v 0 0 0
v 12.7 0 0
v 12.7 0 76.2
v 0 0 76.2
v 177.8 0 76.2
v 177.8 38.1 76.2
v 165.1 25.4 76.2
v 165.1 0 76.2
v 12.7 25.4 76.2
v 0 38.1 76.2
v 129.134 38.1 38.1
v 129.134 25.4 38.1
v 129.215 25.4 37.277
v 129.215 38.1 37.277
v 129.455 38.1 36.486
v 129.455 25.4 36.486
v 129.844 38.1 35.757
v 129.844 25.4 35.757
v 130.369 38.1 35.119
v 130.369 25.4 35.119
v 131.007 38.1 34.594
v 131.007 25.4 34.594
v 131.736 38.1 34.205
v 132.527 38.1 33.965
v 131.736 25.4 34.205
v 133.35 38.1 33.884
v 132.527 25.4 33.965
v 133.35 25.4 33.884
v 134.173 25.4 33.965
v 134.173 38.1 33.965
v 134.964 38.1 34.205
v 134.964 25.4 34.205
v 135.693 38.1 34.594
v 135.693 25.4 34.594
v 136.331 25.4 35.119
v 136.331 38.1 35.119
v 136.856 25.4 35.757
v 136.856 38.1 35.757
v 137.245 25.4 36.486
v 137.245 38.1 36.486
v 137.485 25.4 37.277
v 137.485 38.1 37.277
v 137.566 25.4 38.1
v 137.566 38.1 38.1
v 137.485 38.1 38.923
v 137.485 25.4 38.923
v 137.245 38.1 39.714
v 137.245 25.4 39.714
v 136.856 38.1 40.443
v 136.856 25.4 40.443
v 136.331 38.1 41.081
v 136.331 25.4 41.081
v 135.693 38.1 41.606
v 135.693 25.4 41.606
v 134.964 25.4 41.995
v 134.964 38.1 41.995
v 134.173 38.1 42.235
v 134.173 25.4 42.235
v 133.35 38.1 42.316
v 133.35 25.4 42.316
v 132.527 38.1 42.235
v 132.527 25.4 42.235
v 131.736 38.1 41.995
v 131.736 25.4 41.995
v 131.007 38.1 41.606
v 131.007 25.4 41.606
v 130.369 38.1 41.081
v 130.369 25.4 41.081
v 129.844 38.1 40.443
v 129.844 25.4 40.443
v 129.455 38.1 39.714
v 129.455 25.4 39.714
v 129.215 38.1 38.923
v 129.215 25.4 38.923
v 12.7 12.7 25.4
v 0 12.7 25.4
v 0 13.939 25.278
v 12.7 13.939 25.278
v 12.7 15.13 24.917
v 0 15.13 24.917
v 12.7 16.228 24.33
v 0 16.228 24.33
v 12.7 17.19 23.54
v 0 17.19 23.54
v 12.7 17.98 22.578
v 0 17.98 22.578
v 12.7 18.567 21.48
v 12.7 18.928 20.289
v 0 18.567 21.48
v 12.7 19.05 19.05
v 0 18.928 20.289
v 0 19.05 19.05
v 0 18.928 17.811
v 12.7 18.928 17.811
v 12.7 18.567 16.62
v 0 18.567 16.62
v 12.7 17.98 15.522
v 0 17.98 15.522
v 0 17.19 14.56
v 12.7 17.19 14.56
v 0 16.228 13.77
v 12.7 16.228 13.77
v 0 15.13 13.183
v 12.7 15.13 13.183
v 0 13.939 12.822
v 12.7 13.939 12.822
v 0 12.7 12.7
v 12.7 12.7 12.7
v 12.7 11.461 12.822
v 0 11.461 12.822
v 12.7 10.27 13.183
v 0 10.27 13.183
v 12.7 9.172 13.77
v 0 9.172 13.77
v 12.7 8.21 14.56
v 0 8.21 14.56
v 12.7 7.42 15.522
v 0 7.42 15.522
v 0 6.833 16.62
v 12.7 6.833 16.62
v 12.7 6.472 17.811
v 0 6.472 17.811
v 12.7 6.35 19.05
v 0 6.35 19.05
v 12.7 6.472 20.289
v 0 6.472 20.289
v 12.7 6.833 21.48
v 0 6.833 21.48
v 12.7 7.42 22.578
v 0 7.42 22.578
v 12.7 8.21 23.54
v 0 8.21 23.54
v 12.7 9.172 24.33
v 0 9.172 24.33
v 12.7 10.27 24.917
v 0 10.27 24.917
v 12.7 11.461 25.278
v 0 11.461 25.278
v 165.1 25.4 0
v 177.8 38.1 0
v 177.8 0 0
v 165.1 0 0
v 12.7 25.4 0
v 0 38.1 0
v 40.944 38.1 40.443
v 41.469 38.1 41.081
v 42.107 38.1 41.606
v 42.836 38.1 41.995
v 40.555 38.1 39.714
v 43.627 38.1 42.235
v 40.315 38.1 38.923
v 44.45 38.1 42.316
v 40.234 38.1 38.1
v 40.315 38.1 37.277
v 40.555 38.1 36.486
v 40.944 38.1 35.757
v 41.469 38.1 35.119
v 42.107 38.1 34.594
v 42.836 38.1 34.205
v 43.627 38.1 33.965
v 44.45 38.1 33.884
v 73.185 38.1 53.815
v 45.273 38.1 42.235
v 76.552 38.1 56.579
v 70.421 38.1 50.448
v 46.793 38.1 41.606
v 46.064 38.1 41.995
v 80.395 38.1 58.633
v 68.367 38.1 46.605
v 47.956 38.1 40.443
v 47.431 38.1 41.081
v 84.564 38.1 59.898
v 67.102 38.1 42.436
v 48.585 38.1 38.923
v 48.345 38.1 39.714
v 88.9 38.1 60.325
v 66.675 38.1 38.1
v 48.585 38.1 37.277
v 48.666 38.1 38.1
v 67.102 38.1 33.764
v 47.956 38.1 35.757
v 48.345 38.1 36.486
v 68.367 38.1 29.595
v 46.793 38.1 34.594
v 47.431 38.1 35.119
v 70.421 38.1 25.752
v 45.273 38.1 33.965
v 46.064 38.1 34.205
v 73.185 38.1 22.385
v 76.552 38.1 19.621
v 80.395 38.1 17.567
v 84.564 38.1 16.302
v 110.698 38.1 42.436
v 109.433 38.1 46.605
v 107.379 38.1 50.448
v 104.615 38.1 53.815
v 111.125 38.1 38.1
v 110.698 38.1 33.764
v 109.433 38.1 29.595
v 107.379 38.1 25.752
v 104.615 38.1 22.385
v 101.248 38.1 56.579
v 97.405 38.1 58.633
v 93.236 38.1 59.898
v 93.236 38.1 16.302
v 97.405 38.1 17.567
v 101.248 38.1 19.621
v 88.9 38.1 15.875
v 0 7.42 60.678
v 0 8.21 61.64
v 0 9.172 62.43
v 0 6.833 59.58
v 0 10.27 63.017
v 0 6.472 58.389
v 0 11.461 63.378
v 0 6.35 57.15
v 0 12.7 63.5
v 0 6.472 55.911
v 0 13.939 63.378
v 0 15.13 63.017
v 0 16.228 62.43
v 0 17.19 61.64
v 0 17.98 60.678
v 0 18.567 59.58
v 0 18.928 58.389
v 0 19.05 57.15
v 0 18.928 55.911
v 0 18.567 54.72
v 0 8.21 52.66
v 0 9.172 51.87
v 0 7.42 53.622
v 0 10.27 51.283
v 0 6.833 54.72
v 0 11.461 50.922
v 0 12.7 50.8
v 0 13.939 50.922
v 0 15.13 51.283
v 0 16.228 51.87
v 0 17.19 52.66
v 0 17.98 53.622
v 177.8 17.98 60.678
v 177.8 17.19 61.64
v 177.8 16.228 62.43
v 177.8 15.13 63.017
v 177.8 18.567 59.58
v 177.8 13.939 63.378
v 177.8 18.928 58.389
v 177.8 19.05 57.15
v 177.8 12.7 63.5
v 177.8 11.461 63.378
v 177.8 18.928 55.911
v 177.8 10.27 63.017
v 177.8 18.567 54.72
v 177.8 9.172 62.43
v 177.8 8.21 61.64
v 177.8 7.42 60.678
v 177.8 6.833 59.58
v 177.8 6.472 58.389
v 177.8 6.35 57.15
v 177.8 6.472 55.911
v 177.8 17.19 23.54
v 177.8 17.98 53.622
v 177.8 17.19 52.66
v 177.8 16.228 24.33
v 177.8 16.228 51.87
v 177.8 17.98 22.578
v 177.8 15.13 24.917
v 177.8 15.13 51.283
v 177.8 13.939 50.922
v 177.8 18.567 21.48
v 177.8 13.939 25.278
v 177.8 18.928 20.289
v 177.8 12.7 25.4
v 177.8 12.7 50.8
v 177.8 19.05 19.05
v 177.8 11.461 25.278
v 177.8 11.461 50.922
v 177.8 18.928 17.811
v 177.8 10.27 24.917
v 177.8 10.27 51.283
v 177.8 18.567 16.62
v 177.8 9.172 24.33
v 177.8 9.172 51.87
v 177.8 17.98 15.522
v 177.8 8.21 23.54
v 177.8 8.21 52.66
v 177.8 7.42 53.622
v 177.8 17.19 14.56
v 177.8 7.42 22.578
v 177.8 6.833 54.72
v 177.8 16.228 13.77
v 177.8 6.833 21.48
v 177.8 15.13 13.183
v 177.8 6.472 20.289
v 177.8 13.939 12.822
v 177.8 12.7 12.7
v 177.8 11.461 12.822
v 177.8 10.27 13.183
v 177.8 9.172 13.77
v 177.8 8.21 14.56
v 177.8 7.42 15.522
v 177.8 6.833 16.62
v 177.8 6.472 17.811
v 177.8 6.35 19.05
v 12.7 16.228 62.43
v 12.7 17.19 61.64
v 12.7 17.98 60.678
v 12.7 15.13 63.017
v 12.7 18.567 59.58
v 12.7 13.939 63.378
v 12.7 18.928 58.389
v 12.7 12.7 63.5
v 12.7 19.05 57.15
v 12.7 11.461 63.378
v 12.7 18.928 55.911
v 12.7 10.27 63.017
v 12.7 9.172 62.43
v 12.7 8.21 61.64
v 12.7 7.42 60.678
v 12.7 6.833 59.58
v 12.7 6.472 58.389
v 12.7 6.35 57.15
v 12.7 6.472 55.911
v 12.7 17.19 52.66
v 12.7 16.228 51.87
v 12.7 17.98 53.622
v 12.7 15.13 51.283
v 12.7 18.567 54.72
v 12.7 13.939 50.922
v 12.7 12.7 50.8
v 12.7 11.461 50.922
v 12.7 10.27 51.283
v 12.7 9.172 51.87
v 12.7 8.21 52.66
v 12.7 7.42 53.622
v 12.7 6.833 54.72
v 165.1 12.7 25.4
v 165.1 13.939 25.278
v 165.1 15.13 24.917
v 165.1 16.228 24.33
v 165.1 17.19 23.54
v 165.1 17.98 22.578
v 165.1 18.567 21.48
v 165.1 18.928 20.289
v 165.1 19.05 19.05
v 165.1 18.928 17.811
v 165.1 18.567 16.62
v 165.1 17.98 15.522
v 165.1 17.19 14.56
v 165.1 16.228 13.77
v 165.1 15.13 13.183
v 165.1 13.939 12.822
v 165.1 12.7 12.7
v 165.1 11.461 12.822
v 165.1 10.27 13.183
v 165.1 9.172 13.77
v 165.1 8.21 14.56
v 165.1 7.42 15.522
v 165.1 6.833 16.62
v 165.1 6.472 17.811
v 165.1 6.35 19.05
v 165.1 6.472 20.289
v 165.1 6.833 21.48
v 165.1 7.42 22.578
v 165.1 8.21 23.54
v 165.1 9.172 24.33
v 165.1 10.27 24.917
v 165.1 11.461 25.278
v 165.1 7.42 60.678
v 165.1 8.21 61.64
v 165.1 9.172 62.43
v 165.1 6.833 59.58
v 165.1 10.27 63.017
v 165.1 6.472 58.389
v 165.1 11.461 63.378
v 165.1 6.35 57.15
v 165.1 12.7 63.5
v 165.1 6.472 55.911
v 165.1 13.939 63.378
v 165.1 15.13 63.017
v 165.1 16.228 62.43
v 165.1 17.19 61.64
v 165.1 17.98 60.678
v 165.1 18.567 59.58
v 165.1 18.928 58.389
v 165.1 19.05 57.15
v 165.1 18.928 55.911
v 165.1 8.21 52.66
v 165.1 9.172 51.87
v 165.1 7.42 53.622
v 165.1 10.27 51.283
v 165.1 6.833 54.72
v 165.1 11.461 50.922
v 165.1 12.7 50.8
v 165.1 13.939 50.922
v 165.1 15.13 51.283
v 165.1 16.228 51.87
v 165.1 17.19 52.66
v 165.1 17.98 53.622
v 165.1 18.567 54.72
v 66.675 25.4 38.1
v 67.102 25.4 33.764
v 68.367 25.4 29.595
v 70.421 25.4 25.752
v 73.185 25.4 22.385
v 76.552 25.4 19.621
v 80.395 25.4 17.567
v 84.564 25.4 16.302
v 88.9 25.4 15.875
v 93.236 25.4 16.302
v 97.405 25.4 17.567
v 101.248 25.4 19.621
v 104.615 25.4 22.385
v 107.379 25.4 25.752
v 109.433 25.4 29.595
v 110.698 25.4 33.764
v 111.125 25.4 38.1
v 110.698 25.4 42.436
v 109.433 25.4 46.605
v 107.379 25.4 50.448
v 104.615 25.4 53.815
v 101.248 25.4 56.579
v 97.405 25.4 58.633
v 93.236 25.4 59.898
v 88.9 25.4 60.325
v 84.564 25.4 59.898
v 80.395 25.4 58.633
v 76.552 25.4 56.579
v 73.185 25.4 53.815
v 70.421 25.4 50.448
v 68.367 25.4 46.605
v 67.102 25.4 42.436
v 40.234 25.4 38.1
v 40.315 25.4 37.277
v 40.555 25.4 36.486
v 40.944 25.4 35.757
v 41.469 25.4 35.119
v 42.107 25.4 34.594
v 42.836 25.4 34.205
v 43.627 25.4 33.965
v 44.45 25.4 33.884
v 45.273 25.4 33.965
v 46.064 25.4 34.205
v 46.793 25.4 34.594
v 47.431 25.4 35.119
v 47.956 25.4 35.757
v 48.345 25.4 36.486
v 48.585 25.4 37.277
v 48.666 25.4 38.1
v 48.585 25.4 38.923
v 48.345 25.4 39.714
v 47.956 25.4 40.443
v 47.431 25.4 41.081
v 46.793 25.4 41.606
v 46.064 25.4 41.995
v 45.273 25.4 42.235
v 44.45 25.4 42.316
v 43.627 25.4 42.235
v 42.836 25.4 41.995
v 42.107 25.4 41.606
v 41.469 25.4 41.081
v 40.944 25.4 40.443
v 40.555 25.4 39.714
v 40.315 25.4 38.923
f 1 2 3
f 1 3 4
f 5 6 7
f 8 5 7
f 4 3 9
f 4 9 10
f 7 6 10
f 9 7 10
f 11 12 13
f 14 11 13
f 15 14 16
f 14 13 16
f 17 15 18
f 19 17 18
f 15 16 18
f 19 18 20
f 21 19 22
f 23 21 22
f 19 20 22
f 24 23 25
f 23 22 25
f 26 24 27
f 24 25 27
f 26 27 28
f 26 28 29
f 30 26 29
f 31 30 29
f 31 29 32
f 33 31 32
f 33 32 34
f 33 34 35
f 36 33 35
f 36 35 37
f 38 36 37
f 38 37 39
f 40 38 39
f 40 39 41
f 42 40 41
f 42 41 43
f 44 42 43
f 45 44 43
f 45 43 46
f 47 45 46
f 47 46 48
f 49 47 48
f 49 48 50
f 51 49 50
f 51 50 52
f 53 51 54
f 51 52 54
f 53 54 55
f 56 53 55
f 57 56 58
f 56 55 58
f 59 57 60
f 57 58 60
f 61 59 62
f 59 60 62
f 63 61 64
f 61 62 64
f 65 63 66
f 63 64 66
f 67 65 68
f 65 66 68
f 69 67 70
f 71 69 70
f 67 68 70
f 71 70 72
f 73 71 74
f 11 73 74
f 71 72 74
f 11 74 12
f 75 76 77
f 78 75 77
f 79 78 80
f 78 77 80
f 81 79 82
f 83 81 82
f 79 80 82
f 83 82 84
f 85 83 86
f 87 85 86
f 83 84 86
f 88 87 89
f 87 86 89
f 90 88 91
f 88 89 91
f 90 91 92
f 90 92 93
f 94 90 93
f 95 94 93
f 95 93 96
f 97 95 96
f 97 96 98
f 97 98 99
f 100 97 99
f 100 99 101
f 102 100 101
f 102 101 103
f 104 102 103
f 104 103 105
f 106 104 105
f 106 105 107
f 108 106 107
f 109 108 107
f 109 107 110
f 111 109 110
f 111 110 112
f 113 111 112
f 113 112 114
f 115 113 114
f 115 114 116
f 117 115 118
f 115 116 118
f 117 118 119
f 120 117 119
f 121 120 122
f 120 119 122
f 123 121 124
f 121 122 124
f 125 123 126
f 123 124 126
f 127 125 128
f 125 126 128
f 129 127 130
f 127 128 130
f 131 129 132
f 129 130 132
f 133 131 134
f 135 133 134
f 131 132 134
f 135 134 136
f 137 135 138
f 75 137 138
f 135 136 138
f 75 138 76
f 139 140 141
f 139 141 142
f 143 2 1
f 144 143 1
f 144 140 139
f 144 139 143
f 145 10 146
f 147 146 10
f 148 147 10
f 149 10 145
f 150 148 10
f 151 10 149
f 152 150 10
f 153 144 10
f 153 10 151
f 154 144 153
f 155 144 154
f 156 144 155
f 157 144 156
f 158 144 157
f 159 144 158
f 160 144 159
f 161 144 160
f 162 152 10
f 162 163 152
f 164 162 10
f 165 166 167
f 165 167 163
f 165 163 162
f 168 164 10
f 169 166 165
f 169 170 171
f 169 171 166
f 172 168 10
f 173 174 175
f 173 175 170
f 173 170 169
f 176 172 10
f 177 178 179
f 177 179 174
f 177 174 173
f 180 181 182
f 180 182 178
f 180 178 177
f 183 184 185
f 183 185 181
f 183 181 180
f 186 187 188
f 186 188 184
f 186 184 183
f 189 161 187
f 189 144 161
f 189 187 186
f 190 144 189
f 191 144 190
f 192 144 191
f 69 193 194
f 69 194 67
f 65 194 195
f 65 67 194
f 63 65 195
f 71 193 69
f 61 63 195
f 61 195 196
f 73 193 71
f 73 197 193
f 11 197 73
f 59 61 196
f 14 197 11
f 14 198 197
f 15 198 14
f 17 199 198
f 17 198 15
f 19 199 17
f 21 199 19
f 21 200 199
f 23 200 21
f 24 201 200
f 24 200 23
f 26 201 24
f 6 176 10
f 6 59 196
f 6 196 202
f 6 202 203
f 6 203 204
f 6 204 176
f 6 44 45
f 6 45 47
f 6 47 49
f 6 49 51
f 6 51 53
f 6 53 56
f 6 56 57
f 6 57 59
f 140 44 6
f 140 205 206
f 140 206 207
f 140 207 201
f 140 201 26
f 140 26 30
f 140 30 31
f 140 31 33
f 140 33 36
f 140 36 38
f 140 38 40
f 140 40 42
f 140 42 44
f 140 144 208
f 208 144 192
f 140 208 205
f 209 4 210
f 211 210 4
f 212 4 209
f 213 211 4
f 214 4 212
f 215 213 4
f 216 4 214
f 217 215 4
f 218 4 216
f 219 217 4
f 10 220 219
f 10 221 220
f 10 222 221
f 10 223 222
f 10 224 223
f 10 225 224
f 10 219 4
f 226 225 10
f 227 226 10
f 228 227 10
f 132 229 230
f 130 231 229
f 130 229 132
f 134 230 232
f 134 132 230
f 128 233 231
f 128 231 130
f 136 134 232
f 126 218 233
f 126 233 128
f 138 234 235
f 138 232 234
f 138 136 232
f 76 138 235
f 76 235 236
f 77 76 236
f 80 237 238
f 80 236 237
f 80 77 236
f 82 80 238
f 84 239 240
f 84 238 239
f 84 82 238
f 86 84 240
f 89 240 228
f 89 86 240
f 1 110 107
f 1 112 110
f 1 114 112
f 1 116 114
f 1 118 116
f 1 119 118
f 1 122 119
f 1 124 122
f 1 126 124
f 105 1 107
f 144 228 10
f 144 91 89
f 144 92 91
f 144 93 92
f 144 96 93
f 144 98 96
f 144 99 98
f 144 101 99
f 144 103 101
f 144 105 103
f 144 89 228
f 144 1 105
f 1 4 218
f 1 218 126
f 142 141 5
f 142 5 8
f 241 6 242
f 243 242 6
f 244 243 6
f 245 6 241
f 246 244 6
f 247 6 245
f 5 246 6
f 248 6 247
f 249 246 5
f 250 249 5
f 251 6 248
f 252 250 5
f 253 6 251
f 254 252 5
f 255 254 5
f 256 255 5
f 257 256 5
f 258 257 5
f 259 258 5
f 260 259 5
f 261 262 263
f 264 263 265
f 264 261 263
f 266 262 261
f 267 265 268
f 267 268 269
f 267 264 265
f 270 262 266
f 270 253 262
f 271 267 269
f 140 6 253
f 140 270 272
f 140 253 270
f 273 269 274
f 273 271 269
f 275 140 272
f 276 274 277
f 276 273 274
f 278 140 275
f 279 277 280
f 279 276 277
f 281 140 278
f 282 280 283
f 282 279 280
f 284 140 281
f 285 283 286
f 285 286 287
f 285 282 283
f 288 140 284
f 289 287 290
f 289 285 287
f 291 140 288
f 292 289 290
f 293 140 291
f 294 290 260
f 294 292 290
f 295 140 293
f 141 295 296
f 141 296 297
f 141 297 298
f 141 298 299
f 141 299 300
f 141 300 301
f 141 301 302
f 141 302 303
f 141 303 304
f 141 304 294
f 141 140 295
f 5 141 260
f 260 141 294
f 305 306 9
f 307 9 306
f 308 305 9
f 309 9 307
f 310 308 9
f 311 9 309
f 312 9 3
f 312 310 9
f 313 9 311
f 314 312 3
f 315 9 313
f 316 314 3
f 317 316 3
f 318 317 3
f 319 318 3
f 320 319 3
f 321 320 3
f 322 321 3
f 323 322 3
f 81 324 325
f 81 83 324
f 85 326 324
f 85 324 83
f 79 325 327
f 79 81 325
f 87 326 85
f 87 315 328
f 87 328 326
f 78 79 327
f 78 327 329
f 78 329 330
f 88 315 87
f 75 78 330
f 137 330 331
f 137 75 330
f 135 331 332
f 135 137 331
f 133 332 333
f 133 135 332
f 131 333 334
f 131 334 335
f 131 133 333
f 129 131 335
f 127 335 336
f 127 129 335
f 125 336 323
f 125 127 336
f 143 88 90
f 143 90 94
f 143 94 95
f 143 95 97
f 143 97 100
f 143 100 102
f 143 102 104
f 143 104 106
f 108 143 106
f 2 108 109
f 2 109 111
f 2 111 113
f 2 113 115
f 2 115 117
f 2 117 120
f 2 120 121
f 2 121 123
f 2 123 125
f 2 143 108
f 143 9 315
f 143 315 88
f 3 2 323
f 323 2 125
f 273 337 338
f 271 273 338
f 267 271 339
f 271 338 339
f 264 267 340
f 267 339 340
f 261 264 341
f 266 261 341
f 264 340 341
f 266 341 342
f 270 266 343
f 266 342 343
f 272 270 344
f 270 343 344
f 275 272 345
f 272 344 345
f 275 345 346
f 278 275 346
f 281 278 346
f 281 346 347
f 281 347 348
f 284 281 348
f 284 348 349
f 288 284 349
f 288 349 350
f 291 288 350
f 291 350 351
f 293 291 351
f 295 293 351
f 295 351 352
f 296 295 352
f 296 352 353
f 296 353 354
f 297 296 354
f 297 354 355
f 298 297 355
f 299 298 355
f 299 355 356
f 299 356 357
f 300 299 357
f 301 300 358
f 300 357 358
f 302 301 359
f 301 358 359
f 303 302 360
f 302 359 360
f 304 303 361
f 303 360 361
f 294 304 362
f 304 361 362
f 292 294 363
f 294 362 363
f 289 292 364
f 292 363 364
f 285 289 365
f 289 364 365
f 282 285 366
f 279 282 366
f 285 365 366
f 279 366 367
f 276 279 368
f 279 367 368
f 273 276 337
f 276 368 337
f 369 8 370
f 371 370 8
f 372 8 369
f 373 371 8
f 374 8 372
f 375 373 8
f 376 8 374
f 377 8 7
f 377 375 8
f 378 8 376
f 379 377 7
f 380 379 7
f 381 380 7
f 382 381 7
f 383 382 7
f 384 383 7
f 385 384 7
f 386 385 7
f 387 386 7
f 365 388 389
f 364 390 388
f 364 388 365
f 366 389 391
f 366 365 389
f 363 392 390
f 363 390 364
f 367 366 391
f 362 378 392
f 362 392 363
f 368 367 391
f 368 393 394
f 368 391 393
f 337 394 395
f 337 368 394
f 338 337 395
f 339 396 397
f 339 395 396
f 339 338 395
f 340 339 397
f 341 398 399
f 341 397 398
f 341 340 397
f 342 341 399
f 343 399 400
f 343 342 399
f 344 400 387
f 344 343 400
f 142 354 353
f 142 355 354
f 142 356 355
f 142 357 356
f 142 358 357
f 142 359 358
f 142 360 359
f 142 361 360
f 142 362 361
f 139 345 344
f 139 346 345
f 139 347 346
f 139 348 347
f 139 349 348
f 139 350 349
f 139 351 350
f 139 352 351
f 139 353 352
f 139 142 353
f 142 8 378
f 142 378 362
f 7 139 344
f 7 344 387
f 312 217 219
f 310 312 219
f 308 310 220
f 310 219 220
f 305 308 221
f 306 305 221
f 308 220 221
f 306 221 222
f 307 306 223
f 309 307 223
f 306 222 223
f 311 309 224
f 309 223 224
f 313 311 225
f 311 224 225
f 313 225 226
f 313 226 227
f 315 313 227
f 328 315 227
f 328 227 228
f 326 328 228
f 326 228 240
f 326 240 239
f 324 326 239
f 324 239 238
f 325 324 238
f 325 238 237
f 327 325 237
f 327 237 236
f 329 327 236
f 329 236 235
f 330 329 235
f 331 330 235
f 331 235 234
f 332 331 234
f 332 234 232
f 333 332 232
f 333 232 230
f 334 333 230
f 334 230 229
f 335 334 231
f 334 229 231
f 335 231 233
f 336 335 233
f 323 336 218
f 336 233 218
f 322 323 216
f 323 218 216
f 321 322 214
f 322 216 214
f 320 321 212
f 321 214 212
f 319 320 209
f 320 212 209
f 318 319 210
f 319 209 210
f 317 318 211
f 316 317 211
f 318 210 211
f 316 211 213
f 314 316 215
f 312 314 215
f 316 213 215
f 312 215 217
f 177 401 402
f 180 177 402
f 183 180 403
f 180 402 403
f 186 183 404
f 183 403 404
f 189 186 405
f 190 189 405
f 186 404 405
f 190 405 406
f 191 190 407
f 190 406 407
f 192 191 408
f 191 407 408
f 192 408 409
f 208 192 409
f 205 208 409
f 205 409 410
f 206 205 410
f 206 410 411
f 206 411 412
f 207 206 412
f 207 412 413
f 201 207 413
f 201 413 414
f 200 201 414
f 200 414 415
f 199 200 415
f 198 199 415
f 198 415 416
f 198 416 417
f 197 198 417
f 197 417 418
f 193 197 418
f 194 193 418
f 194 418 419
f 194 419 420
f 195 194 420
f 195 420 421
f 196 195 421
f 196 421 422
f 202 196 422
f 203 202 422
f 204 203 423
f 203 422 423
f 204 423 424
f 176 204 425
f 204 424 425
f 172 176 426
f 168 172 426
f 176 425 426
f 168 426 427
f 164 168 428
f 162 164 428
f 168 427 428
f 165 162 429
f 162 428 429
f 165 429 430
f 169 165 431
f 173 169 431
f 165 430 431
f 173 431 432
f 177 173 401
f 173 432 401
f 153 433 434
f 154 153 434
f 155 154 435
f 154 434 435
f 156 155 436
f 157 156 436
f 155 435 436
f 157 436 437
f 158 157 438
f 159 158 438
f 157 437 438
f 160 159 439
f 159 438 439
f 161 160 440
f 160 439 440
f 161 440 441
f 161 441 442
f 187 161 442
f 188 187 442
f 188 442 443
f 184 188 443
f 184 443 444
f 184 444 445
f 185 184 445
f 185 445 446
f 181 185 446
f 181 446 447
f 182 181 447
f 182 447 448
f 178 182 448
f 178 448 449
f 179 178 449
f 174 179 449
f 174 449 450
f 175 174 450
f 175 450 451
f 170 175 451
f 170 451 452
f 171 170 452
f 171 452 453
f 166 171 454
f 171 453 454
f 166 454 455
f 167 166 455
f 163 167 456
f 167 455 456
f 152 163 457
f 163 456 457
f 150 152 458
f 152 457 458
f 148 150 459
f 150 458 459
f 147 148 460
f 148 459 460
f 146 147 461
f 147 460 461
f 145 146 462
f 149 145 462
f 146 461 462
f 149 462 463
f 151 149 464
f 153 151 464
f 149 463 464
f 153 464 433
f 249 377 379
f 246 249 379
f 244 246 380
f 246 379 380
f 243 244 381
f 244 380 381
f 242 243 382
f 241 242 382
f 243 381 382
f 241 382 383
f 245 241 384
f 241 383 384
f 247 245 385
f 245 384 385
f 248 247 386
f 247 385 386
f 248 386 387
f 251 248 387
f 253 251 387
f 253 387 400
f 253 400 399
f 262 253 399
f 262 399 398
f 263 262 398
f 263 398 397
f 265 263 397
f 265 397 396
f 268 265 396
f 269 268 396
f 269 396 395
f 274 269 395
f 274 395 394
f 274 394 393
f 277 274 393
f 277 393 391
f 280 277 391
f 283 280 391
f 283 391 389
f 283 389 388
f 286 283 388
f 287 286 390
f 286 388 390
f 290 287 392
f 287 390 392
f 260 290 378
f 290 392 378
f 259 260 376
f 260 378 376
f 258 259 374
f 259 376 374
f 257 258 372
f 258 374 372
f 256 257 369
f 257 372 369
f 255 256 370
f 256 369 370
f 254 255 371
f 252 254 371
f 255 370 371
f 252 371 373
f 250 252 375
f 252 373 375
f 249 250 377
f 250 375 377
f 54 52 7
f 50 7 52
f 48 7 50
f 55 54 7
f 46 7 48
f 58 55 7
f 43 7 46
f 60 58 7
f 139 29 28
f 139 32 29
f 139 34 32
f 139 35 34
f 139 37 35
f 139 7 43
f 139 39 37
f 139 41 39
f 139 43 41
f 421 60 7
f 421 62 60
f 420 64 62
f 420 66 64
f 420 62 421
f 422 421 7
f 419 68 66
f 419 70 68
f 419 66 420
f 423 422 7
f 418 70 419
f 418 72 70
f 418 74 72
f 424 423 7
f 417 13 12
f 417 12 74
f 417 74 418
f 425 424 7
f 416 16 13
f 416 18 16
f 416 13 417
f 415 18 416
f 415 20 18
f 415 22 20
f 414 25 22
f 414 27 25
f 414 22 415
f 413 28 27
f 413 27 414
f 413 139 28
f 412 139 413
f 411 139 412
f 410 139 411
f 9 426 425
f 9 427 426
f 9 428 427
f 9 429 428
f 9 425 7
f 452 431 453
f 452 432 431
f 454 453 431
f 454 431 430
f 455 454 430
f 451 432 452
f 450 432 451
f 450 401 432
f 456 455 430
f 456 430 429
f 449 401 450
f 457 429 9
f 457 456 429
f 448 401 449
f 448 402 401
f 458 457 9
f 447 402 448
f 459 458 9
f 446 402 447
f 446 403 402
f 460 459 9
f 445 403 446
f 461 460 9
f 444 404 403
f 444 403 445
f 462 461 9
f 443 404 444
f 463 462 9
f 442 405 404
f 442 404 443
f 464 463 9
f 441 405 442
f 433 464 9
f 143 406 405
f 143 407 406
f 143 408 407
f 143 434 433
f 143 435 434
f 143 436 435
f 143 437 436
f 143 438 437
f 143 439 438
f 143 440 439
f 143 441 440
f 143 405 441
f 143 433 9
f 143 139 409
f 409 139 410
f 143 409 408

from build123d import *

# Parameters (mm, degrees)
BOSS_EXTRUDE1_DEPTH         = 76.2
F_3_8_1_75_DIAMETER_HOLE1_D = 44.45
TAP_DRILL_FOR_3_8_24_TAP1_D = 8.4328
TAP_DRILL_FOR_3_8_24_TAP2_D = 12.7


with BuildPart() as part:
    # Sketch1 → Boss-Extrude1 (new body)
    with BuildSketch(Plane.XY):
        Polygon((0, 0), (0, 38.1), (177.8, 38.1), (177.8, 0), (165.1, 0), (165.1, 25.4), (12.7, 25.4), (12.7, 0), align=None)
    extrude(amount=BOSS_EXTRUDE1_DEPTH)

    # 3/8 (1.75) Diameter Hole1 (through all)
    with Locations(Plane(origin=(0, 38.1, 0), x_dir=(1, 0, 0), z_dir=(0, 1, 0))):
        with Locations((88.9, -38.1)):
            Hole(F_3_8_1_75_DIAMETER_HOLE1_D / 2)

    # Tap Drill for 3/8-24 Tap1 (through all)
    with Locations(Plane(origin=(0, 38.1, 0), x_dir=(1, 0, 0), z_dir=(0, 1, 0))):
        with Locations((44.45, -38.1), (133.35, -38.1)):
            Hole(TAP_DRILL_FOR_3_8_24_TAP1_D / 2)

    # Tap Drill for 3/8-24 Tap2 (through all)
    with Locations(Plane(origin=(177.8, 0, 0), x_dir=(0, 0, -1), z_dir=(1, 0, 0))):
        with Locations((-57.15, 12.7), (-19.05, 12.7)):
            Hole(TAP_DRILL_FOR_3_8_24_TAP2_D / 2)


solid = part.part
